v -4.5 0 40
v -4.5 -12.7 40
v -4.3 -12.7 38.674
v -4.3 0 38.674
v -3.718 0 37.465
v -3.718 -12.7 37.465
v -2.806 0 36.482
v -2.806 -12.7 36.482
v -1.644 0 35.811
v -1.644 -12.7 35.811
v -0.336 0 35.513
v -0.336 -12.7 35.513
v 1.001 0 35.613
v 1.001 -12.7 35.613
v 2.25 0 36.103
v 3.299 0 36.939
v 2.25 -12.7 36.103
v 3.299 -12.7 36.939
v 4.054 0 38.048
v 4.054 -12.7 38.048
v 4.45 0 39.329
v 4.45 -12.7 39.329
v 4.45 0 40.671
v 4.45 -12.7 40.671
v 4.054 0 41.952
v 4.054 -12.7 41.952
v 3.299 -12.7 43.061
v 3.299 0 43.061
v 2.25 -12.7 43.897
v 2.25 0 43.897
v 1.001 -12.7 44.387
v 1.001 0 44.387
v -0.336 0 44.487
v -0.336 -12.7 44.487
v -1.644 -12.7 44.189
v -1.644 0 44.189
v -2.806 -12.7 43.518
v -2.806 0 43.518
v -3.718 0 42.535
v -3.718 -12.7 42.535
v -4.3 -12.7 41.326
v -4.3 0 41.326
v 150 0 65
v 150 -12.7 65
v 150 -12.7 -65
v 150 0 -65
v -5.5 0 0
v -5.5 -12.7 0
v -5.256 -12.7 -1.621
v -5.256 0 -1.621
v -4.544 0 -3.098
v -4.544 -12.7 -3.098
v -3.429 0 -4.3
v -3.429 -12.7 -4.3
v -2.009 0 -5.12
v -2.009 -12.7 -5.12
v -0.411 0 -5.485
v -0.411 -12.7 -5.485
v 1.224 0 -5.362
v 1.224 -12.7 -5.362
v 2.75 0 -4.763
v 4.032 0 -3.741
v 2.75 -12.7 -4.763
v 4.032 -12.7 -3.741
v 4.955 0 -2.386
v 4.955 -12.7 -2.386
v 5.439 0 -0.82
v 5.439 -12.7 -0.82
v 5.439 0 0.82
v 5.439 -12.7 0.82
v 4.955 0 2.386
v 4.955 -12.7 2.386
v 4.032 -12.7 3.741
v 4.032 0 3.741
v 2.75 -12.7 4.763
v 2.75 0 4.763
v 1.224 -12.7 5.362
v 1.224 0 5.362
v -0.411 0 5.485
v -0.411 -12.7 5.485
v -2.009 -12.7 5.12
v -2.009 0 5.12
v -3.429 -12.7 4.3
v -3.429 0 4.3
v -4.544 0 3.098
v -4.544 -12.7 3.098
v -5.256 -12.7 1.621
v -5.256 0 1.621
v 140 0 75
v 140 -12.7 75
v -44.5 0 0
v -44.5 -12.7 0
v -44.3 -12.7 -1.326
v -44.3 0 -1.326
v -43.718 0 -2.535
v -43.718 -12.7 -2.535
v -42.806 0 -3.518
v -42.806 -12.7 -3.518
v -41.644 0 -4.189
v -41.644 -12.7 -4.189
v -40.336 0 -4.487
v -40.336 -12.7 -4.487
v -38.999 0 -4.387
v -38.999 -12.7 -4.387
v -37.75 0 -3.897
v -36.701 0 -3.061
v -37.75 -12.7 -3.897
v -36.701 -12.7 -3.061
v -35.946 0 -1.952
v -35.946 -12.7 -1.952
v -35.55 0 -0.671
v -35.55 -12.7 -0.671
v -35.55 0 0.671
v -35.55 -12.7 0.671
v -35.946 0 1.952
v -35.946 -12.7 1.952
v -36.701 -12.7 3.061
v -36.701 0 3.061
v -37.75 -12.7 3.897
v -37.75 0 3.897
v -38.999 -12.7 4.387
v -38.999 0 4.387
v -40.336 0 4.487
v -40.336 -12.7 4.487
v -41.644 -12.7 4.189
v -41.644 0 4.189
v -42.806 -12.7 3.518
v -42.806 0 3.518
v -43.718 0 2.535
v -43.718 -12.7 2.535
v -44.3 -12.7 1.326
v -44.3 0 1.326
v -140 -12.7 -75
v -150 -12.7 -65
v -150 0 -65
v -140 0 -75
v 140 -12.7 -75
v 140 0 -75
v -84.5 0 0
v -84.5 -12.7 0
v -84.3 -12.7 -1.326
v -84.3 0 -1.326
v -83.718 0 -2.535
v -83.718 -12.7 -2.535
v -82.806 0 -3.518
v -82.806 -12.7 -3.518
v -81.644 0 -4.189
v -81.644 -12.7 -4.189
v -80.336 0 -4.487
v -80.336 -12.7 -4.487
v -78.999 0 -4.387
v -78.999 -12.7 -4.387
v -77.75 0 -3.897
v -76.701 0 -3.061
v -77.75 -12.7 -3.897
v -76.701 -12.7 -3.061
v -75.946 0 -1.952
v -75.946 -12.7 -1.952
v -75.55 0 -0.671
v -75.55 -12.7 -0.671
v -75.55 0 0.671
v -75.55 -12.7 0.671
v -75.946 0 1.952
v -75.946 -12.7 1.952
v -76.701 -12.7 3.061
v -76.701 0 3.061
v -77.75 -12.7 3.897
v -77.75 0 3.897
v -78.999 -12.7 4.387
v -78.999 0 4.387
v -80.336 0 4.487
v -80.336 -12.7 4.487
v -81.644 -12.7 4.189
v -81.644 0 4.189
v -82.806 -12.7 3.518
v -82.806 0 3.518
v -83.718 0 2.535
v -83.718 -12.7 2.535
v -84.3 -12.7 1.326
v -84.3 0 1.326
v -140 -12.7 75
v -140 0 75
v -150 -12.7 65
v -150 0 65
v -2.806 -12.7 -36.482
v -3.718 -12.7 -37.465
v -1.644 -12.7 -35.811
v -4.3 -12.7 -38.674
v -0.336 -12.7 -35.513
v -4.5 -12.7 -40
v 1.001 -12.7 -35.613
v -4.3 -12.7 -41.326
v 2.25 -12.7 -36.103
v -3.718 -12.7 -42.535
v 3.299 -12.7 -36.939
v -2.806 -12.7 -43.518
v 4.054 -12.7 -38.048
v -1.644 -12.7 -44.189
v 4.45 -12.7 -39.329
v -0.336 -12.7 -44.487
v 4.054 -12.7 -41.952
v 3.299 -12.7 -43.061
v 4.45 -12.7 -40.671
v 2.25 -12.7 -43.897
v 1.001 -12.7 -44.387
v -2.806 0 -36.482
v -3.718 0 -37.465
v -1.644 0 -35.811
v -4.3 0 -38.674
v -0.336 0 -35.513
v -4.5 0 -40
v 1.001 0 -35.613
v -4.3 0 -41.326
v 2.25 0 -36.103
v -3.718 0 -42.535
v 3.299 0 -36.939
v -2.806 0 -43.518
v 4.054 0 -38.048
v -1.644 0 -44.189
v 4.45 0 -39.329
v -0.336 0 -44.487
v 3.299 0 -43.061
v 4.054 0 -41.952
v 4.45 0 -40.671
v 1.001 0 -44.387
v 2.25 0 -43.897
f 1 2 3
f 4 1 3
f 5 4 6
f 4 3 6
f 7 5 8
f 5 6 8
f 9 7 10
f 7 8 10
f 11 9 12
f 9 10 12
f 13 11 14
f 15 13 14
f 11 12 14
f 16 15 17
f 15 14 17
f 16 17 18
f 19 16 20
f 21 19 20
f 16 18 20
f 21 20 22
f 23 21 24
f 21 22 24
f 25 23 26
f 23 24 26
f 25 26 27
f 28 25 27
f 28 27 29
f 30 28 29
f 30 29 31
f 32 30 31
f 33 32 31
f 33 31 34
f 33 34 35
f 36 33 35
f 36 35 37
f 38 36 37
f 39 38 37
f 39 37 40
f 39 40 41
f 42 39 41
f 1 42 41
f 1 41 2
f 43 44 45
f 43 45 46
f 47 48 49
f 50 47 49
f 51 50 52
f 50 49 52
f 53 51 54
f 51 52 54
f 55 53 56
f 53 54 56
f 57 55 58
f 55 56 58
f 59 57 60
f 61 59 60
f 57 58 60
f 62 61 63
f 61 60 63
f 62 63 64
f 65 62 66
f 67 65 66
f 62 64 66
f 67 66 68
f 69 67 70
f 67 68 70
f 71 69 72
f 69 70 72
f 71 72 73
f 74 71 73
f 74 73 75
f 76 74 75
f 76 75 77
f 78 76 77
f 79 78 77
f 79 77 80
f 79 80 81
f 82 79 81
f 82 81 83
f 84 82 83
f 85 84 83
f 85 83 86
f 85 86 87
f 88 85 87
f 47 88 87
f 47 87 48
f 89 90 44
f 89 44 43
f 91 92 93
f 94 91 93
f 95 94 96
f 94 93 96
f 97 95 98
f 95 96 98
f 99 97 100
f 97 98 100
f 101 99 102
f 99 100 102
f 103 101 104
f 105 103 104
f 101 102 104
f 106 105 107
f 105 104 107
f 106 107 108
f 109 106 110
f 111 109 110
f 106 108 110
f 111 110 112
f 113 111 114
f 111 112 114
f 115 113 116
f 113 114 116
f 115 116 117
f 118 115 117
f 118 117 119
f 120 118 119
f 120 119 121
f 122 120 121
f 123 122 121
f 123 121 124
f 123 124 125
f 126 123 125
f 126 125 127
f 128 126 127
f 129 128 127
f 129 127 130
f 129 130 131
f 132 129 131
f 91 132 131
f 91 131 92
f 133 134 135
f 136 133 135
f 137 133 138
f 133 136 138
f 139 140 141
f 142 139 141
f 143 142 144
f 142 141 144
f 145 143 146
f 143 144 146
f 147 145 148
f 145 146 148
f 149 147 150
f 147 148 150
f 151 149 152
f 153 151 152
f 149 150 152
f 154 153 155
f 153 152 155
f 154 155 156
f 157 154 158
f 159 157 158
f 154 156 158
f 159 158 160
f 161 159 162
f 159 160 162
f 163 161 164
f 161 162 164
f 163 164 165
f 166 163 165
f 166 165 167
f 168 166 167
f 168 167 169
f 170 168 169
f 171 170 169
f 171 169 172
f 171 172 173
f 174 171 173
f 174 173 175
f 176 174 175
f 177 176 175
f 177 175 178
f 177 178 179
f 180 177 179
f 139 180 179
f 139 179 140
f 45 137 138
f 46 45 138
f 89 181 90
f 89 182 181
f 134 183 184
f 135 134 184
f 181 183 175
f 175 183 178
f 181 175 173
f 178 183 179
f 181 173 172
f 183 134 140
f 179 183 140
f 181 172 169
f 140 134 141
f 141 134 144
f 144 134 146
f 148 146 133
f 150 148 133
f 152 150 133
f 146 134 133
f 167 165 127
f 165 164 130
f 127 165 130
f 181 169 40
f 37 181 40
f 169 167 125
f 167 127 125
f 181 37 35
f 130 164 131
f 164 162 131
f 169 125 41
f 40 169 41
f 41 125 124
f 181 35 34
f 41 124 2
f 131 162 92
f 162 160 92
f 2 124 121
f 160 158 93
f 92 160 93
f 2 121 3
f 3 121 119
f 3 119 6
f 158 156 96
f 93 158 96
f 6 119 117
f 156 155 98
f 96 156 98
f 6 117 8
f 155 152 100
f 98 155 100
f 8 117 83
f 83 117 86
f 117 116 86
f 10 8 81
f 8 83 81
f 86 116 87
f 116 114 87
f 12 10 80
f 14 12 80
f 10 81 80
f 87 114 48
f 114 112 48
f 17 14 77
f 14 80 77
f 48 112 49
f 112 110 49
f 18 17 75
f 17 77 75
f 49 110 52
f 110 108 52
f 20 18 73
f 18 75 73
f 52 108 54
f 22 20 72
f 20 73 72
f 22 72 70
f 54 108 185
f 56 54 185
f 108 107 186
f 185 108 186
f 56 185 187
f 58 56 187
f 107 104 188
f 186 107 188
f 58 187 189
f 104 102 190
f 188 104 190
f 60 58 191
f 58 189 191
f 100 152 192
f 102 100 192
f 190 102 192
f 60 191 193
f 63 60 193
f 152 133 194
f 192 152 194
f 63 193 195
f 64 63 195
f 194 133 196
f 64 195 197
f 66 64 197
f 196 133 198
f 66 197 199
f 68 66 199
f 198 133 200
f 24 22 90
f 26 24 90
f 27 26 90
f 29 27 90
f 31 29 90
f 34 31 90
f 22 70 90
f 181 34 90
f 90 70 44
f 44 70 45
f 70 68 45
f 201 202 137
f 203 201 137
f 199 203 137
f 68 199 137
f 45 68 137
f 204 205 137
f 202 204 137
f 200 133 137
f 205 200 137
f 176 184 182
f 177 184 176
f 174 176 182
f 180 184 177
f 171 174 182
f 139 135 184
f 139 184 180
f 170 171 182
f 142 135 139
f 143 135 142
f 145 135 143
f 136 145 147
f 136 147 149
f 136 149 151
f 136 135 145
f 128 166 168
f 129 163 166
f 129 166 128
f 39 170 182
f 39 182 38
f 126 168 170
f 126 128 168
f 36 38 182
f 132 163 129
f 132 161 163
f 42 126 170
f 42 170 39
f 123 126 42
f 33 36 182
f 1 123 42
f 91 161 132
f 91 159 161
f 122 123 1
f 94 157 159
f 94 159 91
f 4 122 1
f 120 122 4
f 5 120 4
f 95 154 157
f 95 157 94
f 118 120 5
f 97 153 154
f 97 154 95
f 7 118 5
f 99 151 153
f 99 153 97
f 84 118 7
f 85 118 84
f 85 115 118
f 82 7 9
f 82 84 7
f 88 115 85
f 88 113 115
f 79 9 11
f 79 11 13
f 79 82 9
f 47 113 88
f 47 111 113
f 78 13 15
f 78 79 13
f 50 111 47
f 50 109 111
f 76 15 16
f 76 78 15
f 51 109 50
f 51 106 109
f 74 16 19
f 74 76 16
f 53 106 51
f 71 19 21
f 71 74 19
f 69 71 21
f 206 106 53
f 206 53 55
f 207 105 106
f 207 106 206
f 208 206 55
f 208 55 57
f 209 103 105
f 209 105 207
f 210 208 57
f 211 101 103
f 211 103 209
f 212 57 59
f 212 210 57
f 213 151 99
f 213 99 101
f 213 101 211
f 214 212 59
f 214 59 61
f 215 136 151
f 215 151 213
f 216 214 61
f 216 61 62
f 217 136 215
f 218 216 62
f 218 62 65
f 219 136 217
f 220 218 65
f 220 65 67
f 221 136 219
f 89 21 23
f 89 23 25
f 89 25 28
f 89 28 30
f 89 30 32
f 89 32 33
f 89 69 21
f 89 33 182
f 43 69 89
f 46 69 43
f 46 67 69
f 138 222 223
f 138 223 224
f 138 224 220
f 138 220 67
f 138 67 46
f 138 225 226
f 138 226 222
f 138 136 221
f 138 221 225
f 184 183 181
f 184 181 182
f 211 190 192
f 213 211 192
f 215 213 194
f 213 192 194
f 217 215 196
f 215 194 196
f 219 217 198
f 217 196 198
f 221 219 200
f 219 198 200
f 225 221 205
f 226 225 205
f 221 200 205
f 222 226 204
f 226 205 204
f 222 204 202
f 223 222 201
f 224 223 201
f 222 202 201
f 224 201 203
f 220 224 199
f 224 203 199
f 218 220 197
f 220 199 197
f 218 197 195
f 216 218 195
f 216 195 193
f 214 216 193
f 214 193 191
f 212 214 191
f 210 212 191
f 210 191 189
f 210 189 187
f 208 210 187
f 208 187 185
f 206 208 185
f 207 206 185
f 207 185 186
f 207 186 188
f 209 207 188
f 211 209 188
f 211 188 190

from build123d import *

# Parameters (mm, degrees)
BASE_FLANGE1_START     = -75
BASE_FLANGE1_OUTLINE_W = 300
BASE_FLANGE1_OUTLINE_H = 12.7
BASE_FLANGE1_DEPTH     = 150
M10_CLEARANCE_HOLE1_D  = 11
M8_CLEARANCE_HOLE1_D   = 9
CHAMFER1_SIZE          = 10


# Read off the part's stored shape, not the designer's step: Base-Flange1
with BuildPart() as part:
    # Base-Flange1 outline → Base-Flange1 (new body)
    with BuildSketch(Plane.XY.offset(BASE_FLANGE1_START)):
        with Locations((0, -6.35)):
            Rectangle(BASE_FLANGE1_OUTLINE_W, BASE_FLANGE1_OUTLINE_H)
    extrude(amount=BASE_FLANGE1_DEPTH)

    # M10 Clearance Hole1 (through all)
    with Locations(Plane(origin=(0, 0, 0), x_dir=(1, 0, 0), z_dir=(0, 1, 0))):
        with Locations((0, 0)):
            Hole(M10_CLEARANCE_HOLE1_D / 2)

    # M8 Clearance Hole1 (through all)
    with Locations(Plane(origin=(0, 0, 0), x_dir=(1, 0, 0), z_dir=(0, 1, 0))):
        with Locations((-40, 0), (0, -40), (0, 40), (-80, 0)):
            Hole(M8_CLEARANCE_HOLE1_D / 2)

    # Chamfer1
    chamfer1_edges = [part.edges().sort_by_distance(p)[0] for p in [
        (-150, -6.35, 75),
        (-150, -6.35, -75),
        (150, -6.35, -75),
        (150, -6.35, 75),
    ]]
    chamfer(chamfer1_edges, length=CHAMFER1_SIZE)


solid = part.part
